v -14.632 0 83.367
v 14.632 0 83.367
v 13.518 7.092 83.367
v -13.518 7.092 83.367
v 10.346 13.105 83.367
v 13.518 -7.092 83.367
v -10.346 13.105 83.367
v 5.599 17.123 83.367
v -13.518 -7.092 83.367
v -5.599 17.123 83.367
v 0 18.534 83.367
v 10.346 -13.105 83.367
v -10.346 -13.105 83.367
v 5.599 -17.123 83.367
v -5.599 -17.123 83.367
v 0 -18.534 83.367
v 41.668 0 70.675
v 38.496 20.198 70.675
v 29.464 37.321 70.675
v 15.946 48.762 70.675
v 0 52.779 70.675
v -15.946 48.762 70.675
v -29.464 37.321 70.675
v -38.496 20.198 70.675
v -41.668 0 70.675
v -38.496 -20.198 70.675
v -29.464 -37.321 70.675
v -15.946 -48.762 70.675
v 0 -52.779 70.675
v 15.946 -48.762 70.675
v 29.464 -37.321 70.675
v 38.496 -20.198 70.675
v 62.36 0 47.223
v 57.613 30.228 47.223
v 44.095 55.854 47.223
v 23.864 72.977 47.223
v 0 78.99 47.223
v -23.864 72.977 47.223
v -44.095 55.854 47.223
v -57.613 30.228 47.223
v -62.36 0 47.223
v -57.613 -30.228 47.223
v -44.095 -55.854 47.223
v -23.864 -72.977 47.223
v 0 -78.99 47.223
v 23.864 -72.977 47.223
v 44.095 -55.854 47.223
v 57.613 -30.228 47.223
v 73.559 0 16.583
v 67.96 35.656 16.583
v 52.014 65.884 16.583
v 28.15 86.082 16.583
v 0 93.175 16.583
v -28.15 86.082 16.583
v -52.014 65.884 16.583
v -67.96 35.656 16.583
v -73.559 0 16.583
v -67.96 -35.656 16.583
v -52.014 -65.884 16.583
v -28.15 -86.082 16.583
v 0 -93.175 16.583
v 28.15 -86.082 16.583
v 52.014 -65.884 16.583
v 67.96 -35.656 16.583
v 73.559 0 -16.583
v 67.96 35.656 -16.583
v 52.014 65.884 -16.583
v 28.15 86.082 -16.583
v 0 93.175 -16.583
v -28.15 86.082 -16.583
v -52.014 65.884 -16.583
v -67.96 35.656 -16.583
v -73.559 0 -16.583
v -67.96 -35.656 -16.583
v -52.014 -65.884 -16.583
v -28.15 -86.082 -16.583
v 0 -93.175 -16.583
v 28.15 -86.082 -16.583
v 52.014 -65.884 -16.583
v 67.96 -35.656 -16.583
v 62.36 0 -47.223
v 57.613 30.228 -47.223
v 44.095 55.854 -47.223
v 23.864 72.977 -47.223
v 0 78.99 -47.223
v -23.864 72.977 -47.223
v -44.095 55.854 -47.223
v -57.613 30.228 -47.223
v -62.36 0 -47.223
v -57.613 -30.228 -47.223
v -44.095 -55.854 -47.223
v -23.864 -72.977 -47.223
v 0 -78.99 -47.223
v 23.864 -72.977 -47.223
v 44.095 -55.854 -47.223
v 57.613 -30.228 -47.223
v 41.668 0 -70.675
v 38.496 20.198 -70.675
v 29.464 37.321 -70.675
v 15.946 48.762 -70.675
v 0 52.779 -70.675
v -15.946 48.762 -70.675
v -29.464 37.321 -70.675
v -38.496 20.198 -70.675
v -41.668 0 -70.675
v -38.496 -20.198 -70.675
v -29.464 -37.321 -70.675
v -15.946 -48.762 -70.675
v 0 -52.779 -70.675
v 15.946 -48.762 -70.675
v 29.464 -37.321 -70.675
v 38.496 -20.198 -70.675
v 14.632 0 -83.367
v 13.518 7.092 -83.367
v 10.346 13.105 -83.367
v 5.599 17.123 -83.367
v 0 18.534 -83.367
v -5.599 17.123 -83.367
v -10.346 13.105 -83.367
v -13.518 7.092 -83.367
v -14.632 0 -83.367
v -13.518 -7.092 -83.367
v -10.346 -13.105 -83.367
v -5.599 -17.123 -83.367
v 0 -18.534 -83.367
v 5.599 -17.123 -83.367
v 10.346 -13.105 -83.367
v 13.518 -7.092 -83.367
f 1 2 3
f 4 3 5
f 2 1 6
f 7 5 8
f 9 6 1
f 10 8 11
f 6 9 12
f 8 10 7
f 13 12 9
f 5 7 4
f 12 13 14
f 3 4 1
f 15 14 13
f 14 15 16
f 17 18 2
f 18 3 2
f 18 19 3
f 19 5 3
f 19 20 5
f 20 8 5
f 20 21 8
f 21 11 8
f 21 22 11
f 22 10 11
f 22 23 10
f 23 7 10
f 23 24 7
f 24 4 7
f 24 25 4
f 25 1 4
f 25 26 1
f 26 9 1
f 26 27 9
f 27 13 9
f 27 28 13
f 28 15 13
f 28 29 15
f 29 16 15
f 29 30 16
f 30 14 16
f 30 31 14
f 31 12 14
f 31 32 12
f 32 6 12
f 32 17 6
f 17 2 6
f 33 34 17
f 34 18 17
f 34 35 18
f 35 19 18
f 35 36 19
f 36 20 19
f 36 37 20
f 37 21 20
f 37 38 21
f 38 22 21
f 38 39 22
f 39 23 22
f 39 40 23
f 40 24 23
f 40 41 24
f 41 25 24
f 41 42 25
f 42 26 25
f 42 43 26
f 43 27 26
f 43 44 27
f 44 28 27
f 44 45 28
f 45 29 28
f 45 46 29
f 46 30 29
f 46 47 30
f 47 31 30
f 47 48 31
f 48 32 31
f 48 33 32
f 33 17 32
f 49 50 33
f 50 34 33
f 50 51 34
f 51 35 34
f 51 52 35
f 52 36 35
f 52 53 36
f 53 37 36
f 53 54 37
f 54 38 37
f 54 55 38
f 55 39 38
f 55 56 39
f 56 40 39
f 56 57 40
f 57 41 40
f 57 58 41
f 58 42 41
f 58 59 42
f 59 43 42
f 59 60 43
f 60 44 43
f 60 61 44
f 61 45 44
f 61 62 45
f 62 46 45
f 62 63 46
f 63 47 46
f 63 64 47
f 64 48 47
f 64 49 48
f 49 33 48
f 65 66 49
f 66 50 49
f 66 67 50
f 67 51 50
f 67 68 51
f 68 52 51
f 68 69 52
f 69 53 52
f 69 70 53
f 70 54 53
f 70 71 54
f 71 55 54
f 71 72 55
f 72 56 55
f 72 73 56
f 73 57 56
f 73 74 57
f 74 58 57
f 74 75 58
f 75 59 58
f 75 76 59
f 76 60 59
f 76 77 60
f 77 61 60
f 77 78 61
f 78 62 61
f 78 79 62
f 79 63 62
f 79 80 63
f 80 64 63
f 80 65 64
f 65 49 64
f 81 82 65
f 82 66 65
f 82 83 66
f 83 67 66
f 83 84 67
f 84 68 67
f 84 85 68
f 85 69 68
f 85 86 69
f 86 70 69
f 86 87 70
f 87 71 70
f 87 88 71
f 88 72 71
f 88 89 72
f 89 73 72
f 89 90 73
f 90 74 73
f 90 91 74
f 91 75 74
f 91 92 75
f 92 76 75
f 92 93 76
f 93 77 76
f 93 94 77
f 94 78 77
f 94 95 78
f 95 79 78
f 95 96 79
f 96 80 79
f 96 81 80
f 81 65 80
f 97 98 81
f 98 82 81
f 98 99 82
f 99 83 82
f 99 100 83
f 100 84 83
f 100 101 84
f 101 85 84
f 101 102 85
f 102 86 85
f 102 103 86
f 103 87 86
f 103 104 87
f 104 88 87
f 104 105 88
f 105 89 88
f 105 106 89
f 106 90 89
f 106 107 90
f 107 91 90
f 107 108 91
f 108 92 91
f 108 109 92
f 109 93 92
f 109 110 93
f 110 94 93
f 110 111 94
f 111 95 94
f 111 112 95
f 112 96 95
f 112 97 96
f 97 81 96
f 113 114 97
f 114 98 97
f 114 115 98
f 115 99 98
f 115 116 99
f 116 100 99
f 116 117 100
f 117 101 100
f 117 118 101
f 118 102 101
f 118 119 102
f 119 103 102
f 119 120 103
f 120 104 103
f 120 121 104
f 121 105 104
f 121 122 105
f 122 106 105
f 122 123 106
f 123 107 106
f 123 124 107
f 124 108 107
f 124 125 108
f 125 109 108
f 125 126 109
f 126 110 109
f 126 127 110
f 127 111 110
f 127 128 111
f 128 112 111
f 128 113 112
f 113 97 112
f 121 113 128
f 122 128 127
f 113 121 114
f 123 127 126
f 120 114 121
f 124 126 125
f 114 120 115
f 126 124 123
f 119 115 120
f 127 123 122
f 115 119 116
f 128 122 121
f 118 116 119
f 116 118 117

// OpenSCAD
// Generated by SolidPython 1.0.1 on 2020-07-29 00:46:52


scale(v = [15, 19, 17]) {
	sphere(r = 5);
}
/***********************************************
*********      SolidPython code:      **********
************************************************
 
# import packages: SolidPython
from solid import *
from solid.utils import *
from itertools import chain, combinations, permutations


class Resize:

    def __init__(self, scad_file):
        self.scad_file = scad_file
        #self.scad_file = import_scad(scad_file)
        # cone/cylinder param:
        self.r1 = 0
        self.r2 = 0
        self.h = 0
        # rectangular prism param:
        self.w = 0
        self.l = 0
        # ellipse param:
        self.r = 0

    # import OpenScad code (file name corresponds to shape)


    # classify shape + parameters
    def assign(self, param1, param2, param3):
        if self.scad_file == 'cone.scad':
            self.r1 = param1
            self.r2 = param2
            self.h = param3
        elif self.scad_file == 'cylinder.scad':
            self.r1 = param1
            self.r2 = param2
            self.h = param3
        elif self.scad_file == 'rectangularPrism.scad':
            self.h = param1
            self.l = param2
            self.w = param3
        else:
            self.r = param1
            self.h = param2

    # resize parameters
    def iterate(self):
        x = range(3, 20, 2)
        i = 1
        if self.scad_file == 'cone.scad':
            tempList = list(permutations(x, 2))
            for temp in tempList:
                param1 = temp[0]
                param2 = temp[1]
                filepath = 'produced_scad_files/' + 'cone' + str(param1) + '_' + str(param2) + '_' + '.scad'
                scad_render_to_file(cylinder(h=param1, r1=param2, r2=0), filepath)

        elif self.scad_file == 'cylinder.scad':
            tempList = list(permutations(x, 3))
            for temp in tempList:
                param1 = temp[0]
                param2 = temp[1]
                filepath = 'produced_scad_files/' + 'cylinder' + str(param1) + '_' + str(param2) + '_' + '.scad'
                scad_render_to_file(cylinder(h=param1, r1=param2, r2=param2), filepath)

        elif self.scad_file == 'rectangularPrism.scad':
            tempList = list(permutations(x, 3))
            for temp in tempList:
                param1 = temp[0]
                param2 = temp[1]
                param3 = temp[2]
                filepath = 'produced_scad_files/' + 'rectangularPrism' + str(param1) + '_' + str(param2) + '_' + str(
                    param3) + '.scad'
                scad_render_to_file(cube(size=(param1, param2, param3)), filepath)

        elif self.scad_file == 'ellipse.scad':
            tempList = list(permutations(x, 4))
            for temp in tempList:
                param1 = temp[0]
                param2 = temp[1]
                param3 = temp[2]
                param4 = temp[3]
                filepath = 'produced_scad_files/' + 'ellipse' + str(param1) + '_' + str(param2) + '_' + str(param3) + '_' + str(param4) + '.scad'
                scad_render_to_file(scale([param1, param2, param3])(sphere(r=param4)), filepath)

    def render_to_scadfile(self):
        scad_render_to_file(scad, 'example.scad') 
 
************************************************/
